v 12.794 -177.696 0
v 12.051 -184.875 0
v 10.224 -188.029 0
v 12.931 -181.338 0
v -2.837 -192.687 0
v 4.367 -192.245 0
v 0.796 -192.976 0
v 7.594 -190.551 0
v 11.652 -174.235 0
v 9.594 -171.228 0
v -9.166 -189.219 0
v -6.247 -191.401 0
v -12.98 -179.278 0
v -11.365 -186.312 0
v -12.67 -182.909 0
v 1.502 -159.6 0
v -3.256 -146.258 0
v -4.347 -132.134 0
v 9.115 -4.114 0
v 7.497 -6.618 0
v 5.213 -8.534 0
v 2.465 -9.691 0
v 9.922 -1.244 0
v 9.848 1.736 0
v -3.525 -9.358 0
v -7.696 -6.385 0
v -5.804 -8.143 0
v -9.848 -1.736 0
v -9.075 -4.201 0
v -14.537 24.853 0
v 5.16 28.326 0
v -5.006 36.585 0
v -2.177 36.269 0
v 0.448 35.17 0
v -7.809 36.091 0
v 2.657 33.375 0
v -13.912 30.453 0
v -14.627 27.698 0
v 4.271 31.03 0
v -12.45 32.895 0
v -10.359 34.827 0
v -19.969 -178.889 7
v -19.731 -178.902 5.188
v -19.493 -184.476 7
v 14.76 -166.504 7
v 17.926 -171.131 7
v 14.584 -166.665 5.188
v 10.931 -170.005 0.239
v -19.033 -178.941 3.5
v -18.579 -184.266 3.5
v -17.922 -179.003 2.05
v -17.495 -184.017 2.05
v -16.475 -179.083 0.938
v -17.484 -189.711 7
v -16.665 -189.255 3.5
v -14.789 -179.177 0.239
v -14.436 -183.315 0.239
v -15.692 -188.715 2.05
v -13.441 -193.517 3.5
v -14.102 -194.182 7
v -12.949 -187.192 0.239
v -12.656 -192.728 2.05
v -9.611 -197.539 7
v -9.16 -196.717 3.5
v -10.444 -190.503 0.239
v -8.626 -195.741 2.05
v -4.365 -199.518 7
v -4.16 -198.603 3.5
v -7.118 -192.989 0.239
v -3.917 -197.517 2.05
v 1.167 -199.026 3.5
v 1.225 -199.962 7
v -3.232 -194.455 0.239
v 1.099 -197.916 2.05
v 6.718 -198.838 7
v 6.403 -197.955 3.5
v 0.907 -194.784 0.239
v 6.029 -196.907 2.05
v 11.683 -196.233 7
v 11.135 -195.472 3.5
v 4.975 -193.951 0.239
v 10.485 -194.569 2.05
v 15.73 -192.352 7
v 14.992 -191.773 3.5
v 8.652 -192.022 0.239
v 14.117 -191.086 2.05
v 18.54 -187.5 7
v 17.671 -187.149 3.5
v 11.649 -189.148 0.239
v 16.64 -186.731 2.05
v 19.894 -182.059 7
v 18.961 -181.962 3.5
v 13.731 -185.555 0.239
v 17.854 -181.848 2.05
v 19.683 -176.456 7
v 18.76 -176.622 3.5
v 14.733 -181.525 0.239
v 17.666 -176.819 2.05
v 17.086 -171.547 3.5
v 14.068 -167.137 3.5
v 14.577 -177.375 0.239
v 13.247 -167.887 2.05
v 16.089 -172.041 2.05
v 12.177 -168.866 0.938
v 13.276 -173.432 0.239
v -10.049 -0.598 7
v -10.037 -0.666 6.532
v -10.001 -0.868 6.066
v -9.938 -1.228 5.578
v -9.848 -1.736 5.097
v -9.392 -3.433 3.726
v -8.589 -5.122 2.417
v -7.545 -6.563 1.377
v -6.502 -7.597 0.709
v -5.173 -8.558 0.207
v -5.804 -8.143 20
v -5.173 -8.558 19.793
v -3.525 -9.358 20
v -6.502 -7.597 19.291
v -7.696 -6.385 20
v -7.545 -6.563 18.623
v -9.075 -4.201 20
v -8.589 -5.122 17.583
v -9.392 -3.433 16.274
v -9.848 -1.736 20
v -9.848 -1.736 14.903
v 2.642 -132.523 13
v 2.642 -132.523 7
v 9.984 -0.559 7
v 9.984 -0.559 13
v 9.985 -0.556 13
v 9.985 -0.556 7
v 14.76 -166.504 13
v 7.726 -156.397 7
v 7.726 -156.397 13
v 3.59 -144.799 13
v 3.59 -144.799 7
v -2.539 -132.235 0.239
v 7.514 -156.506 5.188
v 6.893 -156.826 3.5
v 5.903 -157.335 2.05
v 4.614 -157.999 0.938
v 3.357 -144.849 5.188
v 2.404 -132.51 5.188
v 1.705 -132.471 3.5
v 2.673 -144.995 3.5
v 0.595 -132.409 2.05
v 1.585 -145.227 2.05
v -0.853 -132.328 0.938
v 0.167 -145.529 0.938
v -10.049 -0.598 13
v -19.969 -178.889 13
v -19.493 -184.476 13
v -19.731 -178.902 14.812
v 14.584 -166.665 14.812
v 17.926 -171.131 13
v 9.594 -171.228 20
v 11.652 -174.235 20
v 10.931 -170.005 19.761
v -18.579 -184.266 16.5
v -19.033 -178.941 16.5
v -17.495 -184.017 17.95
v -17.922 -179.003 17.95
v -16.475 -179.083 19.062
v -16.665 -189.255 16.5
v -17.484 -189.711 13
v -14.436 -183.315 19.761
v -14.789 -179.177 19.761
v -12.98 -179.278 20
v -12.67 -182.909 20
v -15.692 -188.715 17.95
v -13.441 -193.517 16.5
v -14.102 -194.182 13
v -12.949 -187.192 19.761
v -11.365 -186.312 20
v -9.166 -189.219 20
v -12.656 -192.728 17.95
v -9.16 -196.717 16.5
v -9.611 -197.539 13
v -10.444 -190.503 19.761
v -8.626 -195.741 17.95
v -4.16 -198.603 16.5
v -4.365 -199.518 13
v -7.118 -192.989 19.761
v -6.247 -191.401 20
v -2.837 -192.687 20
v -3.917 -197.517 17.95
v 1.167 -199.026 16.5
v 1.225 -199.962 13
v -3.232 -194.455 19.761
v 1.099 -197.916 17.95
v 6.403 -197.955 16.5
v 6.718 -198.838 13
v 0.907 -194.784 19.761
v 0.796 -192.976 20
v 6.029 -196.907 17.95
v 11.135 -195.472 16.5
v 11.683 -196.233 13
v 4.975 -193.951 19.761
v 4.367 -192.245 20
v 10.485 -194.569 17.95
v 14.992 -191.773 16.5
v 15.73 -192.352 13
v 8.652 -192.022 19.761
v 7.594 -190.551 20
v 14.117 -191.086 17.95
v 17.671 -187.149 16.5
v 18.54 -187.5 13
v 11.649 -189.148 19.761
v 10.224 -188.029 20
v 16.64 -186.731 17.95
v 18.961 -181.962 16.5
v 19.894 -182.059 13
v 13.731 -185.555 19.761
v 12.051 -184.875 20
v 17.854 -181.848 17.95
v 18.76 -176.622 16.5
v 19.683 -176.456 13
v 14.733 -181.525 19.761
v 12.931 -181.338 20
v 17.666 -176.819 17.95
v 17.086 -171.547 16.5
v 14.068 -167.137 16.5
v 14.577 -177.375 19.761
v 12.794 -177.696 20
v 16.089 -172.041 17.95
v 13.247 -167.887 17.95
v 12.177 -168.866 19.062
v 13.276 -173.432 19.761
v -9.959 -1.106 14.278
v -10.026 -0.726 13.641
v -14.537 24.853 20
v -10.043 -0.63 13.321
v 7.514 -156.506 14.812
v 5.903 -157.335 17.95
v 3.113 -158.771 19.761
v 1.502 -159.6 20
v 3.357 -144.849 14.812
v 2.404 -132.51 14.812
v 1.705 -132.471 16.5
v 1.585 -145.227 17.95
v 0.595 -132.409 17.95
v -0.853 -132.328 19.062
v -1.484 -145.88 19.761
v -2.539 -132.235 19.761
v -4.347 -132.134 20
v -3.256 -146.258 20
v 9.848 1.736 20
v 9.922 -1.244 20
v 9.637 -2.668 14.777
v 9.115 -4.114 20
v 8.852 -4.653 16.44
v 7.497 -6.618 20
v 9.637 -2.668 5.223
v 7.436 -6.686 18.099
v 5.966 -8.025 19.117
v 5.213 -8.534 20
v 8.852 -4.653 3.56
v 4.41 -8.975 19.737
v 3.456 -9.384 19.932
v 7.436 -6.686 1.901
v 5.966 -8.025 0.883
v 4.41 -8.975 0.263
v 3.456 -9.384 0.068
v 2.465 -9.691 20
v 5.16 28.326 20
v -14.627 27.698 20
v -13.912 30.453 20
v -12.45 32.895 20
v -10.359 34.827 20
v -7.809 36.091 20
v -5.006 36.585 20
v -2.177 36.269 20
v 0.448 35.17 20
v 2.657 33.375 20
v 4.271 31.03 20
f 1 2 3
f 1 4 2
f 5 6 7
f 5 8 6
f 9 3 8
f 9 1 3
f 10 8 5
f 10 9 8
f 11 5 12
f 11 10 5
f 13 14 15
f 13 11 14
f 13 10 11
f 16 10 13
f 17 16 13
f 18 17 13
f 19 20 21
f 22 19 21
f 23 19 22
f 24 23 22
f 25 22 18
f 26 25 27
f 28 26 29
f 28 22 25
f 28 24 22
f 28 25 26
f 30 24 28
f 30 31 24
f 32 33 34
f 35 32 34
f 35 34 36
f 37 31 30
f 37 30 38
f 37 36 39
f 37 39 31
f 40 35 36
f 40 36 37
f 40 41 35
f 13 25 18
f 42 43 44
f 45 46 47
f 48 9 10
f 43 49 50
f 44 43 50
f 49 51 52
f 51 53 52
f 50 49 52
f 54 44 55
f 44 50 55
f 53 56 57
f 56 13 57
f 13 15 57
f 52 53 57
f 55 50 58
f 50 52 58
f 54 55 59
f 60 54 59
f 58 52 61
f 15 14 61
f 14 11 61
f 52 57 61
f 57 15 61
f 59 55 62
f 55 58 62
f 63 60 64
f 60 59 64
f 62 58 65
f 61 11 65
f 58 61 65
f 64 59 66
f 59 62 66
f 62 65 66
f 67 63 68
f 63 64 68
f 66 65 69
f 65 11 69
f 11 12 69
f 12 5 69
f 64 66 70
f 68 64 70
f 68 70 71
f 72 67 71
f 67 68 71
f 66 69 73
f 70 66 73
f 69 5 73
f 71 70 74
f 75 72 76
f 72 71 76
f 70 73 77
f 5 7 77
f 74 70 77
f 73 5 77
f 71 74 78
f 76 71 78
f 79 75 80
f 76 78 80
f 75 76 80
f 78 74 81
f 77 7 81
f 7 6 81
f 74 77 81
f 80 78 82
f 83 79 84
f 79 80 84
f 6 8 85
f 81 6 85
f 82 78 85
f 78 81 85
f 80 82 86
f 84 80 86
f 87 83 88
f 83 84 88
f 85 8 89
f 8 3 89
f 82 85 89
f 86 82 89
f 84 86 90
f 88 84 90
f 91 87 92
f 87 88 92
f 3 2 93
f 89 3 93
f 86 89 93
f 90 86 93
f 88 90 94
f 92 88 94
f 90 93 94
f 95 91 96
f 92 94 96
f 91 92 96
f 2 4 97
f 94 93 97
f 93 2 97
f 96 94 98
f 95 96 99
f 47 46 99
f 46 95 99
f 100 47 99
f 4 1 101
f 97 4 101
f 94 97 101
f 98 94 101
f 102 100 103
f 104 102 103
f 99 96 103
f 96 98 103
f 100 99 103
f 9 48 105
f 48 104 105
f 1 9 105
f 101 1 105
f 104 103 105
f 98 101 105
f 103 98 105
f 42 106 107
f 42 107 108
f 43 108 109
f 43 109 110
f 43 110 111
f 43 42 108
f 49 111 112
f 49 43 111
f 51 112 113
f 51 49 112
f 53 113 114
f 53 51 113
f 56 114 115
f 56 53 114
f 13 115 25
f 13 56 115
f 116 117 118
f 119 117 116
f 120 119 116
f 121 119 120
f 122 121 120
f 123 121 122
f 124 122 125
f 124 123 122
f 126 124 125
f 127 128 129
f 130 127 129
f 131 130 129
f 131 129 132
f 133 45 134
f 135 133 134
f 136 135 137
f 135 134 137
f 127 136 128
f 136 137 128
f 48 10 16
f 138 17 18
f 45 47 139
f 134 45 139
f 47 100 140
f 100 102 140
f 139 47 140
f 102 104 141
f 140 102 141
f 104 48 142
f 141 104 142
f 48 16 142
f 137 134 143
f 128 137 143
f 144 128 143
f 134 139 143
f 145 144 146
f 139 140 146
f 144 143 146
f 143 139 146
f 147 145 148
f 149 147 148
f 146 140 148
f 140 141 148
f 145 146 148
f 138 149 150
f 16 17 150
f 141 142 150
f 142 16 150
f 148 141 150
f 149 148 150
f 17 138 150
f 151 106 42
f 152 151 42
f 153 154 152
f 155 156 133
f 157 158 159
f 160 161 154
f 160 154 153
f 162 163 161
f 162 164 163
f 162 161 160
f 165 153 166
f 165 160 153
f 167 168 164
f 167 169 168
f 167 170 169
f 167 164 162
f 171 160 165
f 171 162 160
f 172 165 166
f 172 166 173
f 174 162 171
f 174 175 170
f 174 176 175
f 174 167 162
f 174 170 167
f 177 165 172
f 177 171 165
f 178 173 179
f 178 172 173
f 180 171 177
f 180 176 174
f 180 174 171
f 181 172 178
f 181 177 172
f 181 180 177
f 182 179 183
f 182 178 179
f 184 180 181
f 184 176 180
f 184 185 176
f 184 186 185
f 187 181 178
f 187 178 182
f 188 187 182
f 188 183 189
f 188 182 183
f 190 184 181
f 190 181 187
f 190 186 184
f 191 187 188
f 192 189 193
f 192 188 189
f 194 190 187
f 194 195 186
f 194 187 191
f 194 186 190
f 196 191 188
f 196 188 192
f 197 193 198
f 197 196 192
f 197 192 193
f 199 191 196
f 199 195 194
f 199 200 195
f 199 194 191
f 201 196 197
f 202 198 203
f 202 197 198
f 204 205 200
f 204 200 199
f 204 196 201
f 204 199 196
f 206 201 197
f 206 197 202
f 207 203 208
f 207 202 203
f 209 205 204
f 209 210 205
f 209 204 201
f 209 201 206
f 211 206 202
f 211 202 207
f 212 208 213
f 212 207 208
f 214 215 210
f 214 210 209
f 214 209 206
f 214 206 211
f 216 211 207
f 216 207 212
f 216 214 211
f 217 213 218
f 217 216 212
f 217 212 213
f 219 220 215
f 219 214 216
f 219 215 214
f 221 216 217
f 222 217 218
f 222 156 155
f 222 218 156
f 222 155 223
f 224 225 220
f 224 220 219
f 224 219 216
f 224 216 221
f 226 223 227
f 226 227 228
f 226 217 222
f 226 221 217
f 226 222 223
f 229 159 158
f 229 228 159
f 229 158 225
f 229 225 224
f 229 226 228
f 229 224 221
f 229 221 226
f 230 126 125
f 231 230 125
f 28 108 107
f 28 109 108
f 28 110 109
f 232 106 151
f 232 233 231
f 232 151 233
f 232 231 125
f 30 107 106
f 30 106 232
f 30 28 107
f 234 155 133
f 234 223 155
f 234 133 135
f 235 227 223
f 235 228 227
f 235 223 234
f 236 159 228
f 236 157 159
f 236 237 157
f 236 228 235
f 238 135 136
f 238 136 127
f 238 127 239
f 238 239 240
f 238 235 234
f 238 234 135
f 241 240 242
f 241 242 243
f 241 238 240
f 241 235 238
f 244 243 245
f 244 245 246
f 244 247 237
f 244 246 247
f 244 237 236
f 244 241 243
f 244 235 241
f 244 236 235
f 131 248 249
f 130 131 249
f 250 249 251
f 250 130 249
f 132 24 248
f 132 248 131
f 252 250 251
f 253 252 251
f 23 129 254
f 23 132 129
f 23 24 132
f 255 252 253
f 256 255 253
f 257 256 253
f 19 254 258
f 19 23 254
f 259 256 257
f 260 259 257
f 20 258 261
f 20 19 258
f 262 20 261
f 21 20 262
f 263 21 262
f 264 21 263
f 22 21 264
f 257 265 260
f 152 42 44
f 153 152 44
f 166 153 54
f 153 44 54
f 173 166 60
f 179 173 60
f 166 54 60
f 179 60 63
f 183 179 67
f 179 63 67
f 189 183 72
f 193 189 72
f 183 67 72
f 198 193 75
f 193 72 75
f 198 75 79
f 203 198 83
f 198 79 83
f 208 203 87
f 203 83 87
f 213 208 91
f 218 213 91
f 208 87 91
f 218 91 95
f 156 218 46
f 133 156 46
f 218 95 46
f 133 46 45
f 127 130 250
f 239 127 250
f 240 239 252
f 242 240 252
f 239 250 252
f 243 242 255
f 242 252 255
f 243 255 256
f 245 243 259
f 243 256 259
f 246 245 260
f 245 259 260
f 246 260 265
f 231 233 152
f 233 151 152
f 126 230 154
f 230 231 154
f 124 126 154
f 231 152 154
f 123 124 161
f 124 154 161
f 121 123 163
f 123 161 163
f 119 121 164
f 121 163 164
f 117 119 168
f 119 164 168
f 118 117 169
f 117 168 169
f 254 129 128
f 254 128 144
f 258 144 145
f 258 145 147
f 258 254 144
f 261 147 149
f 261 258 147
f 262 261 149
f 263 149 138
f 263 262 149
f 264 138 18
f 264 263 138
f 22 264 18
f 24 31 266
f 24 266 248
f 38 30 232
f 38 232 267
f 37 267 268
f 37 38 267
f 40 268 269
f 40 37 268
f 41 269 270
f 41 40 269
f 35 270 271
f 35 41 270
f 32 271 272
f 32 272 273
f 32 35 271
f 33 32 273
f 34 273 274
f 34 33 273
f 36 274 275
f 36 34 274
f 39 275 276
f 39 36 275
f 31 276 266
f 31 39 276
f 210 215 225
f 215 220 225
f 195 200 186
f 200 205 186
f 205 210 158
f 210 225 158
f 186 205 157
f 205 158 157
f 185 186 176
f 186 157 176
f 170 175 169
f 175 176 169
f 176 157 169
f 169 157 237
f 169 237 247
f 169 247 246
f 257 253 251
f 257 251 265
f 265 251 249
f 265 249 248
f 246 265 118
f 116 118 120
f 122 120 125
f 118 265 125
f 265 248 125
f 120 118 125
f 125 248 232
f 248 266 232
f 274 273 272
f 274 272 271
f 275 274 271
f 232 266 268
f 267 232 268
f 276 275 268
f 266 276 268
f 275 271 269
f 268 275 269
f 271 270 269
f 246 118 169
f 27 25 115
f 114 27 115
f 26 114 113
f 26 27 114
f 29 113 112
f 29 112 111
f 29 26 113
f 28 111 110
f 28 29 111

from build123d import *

# Parameters (mm, degrees)
EXTRUDE_1_DEPTH = 20
FILLET_1_R      = 7
EXTRUDE_2_DEPTH = 20


with BuildPart() as part:
    # 草图1 → 凸台-拉伸1 (new body)
    with BuildSketch(Plane.XY):
        with BuildLine():
            Line((-9.984556, 0.555556), (-19.969112, -178.888889))
            ThreePointArc((-19.969112, -178.888889), (6.717955, -198.837969), (14.75992, -166.503898))
            ThreePointArc((14.75992, -166.503898), (5.273091, -150.735791), (2.641696, -132.522913))
            Line((2.641696, -132.522913), (9.984556, -0.555556))
            ThreePointArc((9.984556, -0.555556), (0.555556, 9.984556), (-9.984556, 0.555556))
        make_face()
    extrude(amount=EXTRUDE_1_DEPTH)

    # 圆角1
    fillet_1_edges = [part.edges().sort_by_distance(p)[0] for p in [
        (6.313126, -66.539235, 20),
        (0.555556, 9.984556, 20),
        (-14.976834, -89.166667, 20),
        (6.717955, -198.837969, 20),
        (-14.976834, -89.166667, 0),
        (0.555556, 9.984556, 0),
        (6.313126, -66.539235, 0),
        (5.273091, -150.735791, 0),
        (6.717955, -198.837969, 0),
        (5.273091, -150.735791, 20),
    ]]
    fillet(fillet_1_edges, radius=FILLET_1_R)

    # 草图2 → 凸台-拉伸2 (add)
    with BuildSketch(Plane.XY):
        with BuildLine():
            Line((5.159577, 28.326291), (9.848078, 1.736482))
            ThreePointArc((9.848078, 1.736482), (1.736482, -9.848078), (-9.848078, -1.736482))
            Line((-9.848078, -1.736482), (-14.536578, 24.853328))
            ThreePointArc((-14.536578, 24.853328), (-6.424983, 36.437887), (5.159577, 28.326291))
        make_face()
    extrude(amount=EXTRUDE_2_DEPTH)


solid = part.part
